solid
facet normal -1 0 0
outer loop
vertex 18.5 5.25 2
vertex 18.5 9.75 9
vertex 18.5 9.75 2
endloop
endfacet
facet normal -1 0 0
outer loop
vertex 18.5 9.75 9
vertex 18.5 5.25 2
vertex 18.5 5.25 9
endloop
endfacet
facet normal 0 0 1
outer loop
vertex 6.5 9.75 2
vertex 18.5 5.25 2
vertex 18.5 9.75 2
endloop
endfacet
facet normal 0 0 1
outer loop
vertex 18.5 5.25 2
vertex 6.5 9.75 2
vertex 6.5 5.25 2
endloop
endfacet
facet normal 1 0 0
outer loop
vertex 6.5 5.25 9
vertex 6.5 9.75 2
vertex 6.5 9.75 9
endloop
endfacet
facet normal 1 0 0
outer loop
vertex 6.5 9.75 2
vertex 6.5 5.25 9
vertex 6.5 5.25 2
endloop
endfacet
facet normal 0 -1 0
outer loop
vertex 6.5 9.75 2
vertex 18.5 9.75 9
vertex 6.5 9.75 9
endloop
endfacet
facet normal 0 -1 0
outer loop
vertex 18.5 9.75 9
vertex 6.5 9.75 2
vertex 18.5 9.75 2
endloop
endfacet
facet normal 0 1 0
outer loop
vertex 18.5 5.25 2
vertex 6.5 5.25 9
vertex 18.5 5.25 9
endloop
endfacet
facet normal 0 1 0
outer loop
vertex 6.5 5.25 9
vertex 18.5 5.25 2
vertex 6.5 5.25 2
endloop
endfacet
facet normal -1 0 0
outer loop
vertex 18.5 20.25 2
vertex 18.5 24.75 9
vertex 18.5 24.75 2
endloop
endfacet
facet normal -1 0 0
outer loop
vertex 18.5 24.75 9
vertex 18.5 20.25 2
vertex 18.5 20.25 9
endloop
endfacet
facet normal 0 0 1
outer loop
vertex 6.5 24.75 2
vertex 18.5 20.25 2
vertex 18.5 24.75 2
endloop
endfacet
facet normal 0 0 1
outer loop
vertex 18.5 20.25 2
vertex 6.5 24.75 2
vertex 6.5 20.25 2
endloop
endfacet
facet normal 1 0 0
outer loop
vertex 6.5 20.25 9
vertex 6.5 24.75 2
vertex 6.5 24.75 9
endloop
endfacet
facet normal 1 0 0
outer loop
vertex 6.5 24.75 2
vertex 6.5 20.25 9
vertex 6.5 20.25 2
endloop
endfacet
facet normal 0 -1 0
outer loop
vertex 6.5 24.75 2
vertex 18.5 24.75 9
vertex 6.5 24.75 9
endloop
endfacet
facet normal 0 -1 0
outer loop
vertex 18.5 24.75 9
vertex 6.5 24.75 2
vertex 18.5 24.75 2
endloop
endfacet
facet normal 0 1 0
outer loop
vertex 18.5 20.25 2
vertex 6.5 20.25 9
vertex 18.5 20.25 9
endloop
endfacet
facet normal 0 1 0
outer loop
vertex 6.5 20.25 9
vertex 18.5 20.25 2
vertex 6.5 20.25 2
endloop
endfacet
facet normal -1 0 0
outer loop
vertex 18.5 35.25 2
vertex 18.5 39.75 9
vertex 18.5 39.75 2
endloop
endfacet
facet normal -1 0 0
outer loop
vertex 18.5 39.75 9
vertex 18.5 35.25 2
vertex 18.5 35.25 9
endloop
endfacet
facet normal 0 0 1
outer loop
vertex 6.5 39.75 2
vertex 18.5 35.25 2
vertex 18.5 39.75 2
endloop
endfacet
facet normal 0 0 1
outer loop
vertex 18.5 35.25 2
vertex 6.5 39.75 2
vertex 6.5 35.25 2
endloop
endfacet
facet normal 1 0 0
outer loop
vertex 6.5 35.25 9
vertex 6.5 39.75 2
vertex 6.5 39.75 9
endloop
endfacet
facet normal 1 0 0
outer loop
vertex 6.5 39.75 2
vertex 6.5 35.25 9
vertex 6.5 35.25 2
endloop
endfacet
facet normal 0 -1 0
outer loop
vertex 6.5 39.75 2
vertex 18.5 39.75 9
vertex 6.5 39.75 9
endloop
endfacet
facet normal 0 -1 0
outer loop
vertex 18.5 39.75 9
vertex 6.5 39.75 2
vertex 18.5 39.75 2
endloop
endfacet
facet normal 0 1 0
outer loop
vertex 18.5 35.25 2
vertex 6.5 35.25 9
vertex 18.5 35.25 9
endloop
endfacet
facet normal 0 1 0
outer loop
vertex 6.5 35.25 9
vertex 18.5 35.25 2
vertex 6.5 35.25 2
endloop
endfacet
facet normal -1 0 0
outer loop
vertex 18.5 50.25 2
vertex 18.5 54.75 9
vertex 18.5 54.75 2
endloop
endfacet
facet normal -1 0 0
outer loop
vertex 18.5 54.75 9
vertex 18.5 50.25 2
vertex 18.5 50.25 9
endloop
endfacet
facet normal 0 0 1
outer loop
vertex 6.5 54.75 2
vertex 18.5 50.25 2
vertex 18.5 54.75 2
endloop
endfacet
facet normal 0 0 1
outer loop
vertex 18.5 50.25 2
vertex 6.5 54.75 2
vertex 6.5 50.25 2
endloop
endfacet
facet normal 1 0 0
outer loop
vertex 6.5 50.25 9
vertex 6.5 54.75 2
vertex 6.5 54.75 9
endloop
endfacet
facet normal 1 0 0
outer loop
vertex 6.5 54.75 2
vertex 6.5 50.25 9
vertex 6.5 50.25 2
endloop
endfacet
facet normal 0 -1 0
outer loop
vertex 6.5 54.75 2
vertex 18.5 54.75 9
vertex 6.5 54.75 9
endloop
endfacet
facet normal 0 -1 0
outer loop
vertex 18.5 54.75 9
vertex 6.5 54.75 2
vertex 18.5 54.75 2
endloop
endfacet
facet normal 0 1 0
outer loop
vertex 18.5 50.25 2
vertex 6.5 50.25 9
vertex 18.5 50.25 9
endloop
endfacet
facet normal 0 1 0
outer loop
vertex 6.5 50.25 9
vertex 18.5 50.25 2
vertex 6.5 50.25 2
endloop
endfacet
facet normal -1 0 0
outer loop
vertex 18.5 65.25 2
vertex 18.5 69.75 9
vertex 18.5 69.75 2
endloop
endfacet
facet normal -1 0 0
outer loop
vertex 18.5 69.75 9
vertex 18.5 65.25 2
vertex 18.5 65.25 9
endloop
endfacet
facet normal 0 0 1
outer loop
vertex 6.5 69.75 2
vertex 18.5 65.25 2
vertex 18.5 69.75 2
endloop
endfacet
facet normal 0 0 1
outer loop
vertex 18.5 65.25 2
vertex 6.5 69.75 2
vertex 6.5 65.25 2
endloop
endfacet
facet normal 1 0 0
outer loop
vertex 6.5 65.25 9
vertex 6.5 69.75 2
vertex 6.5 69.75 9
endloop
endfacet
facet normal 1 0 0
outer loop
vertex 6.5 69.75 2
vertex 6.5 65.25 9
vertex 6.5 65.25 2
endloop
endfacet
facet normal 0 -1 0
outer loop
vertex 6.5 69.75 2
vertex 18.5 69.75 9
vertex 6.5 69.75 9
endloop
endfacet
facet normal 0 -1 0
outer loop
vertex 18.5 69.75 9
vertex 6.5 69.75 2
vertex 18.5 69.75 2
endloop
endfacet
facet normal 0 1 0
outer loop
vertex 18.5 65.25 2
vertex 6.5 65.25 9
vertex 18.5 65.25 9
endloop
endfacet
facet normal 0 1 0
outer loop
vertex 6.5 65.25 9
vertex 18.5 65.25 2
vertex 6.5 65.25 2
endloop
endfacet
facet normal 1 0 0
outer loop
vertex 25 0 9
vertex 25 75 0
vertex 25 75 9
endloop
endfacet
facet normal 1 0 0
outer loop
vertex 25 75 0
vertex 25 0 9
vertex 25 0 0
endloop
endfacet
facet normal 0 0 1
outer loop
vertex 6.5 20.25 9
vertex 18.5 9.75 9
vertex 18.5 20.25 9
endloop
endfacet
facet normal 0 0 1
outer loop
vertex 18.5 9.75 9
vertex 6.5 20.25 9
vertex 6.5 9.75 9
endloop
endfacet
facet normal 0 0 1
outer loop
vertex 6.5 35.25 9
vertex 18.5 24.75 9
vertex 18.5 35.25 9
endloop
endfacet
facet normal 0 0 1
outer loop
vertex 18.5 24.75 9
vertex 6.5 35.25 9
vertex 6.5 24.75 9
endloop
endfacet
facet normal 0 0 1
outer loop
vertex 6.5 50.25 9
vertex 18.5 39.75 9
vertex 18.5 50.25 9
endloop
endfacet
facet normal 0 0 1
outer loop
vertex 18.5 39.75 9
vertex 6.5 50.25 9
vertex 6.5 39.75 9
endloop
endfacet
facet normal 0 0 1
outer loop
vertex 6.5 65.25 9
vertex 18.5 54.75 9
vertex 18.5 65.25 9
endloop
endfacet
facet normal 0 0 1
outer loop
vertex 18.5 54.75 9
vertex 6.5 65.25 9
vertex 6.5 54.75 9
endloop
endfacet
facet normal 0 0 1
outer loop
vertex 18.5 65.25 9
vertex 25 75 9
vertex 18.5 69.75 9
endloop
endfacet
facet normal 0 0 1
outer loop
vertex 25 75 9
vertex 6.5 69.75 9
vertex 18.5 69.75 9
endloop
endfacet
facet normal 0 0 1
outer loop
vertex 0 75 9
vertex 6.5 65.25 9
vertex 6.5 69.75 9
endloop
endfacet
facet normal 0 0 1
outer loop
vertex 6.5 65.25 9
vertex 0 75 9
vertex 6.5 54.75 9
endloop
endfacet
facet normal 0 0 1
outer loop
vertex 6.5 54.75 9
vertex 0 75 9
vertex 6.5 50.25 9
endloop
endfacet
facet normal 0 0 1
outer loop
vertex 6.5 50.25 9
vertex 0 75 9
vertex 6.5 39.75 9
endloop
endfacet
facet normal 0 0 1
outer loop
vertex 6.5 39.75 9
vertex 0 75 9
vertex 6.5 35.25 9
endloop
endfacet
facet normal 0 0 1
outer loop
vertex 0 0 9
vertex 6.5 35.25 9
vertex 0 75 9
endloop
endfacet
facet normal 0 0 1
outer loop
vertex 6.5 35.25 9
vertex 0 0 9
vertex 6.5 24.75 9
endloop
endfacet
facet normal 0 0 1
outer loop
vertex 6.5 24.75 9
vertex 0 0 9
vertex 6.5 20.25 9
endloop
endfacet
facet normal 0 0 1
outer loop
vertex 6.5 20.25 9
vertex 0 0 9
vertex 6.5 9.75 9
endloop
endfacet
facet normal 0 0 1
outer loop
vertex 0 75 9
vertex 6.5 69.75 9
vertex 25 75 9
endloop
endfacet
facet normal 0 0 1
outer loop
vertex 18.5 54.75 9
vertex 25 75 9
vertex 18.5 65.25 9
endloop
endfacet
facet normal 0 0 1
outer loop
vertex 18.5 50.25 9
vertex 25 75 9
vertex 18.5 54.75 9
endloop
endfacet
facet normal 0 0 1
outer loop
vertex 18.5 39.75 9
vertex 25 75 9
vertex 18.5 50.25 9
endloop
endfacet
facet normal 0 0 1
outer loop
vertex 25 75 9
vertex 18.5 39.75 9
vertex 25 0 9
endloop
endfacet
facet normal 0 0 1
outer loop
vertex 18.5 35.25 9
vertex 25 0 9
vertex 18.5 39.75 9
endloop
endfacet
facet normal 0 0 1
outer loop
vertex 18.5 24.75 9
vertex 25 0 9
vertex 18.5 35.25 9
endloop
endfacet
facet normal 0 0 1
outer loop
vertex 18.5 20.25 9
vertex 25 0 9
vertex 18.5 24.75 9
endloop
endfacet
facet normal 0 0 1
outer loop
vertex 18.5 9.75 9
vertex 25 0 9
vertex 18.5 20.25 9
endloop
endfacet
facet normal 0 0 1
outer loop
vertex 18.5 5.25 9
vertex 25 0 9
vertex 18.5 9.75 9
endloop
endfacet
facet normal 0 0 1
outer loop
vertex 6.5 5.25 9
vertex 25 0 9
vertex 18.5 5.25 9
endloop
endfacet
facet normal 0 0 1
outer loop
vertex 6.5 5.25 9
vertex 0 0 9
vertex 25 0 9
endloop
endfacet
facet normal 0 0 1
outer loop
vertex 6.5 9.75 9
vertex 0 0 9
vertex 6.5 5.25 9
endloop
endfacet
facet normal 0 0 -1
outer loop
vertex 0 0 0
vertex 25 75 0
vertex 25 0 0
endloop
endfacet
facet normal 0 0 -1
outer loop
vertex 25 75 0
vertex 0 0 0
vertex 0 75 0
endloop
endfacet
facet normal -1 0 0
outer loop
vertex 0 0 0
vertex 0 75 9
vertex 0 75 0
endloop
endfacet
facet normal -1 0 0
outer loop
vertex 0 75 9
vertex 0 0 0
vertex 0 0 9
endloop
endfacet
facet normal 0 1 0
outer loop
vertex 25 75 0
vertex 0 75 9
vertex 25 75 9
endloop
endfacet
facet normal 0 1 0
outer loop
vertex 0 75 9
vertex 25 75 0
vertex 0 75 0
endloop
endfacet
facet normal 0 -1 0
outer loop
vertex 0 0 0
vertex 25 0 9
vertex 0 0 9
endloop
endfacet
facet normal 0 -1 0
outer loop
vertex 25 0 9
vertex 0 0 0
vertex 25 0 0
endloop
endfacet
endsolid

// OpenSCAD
module deviceBlock() 
{
	cols = 1;
	rows = 5;
	
	//Center-to-center
	spacingX = 25; //USB:25
	spacingY = 15; //USB:15

	slotSizeX = 12; //USB:12
	slotSizeY = 4.5; //USB:4.5
	slotSizeZ = 7; //USB:7

	floorThickness = 2;

	blockSizeX = spacingX* (cols); 
	blockSizeY =  spacingY  * (rows);
	blockSizeZ = slotSizeZ + floorThickness;

	difference() {
		cube(size = [blockSizeX, blockSizeY, blockSizeZ]);
		for ( c = [1: cols] ) 
		{
			for ( r = [1: rows] ) 
			{
#				translate( [ spacingX * (c - 0.5) ,spacingY * (r - 0.5), blockSizeZ-(slotSizeZ/2)+.5] ) cube([slotSizeX,slotSizeY,slotSizeZ+1], center = true);
			}
		}
	}
}

deviceBlock();
